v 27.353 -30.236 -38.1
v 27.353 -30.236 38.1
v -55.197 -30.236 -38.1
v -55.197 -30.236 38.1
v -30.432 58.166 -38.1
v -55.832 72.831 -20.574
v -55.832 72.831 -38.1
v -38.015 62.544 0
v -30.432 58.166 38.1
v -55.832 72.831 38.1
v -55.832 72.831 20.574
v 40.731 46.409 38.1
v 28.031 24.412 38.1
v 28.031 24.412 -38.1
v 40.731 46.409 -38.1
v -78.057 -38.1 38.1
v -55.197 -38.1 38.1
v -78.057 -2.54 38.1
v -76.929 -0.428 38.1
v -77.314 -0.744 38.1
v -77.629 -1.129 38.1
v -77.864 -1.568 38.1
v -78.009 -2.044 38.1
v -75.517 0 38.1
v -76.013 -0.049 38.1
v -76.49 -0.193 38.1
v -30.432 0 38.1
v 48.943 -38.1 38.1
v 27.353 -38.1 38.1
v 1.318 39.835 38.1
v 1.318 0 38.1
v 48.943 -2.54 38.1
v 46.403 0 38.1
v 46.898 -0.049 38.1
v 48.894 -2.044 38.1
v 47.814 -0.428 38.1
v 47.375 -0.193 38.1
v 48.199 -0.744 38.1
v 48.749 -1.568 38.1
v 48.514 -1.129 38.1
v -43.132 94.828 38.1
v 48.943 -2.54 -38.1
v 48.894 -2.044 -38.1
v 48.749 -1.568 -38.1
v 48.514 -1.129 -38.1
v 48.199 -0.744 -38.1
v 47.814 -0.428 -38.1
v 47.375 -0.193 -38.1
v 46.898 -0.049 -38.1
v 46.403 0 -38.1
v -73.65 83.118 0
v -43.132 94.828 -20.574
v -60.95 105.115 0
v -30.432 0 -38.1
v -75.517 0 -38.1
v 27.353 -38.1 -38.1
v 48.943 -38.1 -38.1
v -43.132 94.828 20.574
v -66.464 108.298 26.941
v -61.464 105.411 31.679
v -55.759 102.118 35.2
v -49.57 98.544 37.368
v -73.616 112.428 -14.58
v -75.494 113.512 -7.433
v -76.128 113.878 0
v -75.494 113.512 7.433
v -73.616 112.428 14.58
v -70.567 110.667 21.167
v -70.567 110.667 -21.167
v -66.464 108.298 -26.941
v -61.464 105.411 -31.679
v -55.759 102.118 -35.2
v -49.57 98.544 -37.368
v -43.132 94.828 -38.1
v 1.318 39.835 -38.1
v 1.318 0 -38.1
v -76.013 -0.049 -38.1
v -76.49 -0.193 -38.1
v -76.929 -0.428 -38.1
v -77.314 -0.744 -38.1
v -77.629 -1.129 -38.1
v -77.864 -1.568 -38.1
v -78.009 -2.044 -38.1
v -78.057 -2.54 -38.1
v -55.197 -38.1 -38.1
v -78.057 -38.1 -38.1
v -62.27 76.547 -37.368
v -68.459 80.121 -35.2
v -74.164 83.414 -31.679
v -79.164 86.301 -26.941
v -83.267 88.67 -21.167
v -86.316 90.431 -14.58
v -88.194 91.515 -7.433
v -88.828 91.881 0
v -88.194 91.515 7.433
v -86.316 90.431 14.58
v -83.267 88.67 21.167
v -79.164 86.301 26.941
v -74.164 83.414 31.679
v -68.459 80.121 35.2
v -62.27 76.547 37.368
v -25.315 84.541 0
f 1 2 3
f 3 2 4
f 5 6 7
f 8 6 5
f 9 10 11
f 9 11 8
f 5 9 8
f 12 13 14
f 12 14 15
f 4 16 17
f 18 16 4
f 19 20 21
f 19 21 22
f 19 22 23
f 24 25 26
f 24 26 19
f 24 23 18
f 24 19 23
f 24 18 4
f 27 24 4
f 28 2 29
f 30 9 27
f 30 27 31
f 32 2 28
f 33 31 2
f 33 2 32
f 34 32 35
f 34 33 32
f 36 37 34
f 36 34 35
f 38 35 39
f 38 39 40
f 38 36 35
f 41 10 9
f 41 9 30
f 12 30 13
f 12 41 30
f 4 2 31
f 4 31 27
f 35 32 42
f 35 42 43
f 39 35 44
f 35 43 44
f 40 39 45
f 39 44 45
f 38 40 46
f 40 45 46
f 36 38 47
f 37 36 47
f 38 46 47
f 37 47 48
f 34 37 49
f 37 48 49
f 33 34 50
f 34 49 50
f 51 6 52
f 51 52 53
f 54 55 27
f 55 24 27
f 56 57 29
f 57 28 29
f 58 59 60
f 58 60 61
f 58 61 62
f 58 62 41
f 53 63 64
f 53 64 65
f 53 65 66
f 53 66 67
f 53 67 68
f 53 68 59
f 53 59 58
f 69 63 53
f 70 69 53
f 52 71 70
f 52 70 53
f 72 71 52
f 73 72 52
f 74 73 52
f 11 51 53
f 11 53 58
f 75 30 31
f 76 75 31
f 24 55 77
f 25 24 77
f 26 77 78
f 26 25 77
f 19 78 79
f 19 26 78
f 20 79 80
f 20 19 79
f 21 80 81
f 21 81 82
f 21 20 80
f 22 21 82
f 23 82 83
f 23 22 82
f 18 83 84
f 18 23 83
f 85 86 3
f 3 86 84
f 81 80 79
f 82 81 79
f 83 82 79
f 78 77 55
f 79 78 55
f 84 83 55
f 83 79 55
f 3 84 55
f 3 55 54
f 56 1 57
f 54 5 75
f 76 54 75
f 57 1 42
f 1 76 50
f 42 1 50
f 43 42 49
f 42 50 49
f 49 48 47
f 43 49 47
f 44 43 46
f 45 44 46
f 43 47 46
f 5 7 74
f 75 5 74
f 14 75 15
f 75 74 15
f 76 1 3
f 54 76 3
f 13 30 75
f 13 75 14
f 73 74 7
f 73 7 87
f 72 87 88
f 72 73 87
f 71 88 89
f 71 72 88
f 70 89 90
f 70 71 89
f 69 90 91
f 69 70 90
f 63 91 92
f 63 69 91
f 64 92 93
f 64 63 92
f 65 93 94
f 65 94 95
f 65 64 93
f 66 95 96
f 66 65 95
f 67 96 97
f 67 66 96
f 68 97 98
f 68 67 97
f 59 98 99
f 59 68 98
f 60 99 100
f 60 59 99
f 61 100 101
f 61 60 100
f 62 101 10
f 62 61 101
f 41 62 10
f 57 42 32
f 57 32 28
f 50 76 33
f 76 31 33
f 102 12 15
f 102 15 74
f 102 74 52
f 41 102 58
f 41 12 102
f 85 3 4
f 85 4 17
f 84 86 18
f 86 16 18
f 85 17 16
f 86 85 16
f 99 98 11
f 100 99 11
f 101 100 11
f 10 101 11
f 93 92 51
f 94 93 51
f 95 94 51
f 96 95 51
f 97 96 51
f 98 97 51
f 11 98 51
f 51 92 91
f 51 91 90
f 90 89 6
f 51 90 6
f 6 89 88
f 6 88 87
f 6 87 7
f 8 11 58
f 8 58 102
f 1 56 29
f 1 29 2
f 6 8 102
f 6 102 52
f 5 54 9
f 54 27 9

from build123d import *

# Parameters (mm, degrees)
BOSS_EXTRUDE1_DEPTH      = 38.1
BOSS_EXTRUDE1_DEPTH_BACK = 38.1
FILLET3_R                = 2.54
FILLET4_R                = 2.54
BOSS_EXTRUDE2_DEPTH      = 76.2
SKETCH6_R                = 38.1
BOSS_EXTRUDE3_DEPTH      = 25.4
CUT_EXTRUDE2_DEPTH       = 141.480169548


with BuildPart() as part:
    # Sketch1 → Boss-Extrude1 (new, two sides: drawn at the far end of the back side and taken through both)
    with BuildSketch(Plane.XY.offset(-BOSS_EXTRUDE1_DEPTH_BACK)):
        Polygon((-78.057486297, 0), (-30.432486297, 0), (-30.432486297, 58.166), (1.317513703, 58.166), (1.317513703, 0), (48.942513703, 0), (48.942513703, -38.1), (27.352513703, -38.1), (27.352513703, -30.236305156), (-55.197486297, -30.236305156), (-55.197486297, -38.1), (-78.057486297, -38.1), align=None)
    extrude(amount=BOSS_EXTRUDE1_DEPTH + BOSS_EXTRUDE1_DEPTH_BACK)

    # Fillet3
    fillet3_edges = [part.edges().sort_by_distance(p)[0] for p in [
        (48.942513703, 0, 0),
    ]]
    fillet(fillet3_edges, radius=FILLET3_R)

    # Fillet4
    fillet4_edges = [part.edges().sort_by_distance(p)[0] for p in [
        (-78.057486297, 0, 0),
    ]]
    fillet(fillet4_edges, radius=FILLET4_R)

    # Sketch5 → Boss-Extrude2 (add)
    with BuildSketch(Plane.XY.offset(38.1)):
        Polygon((-55.832486297, 72.830696837), (28.031248742, 24.411946837), (40.731248742, 46.408992094), (-43.132486297, 94.827742094), align=None)
    extrude(amount=-BOSS_EXTRUDE2_DEPTH)

    # Sketch6 → Boss-Extrude3 (add)
    with BuildSketch(Plane(origin=(30.278495244, 52.443892139, 0), x_dir=(0.8660254037844386, -0.5000000000000001, 0), z_dir=(0.5000000000000001, 0.8660254037844386, 0))):
        with Locations((-84.767699909, 0)):
            Circle(SKETCH6_R)
    extrude(amount=-BOSS_EXTRUDE3_DEPTH)

    # Sketch7 → Cut-Extrude2 (cut, through all)
    with BuildSketch(Plane(origin=(17.578495244, 30.446846883, 0), x_dir=(-0.8660254037844386, 0.5000000000000001, 0), z_dir=(-0.5000000000000001, -0.8660254037844386, 0))):
        Polygon((84.767699909, 20.574), (105.341699909, 0), (84.767699909, -20.574), (64.193699909, 0), align=None)
    extrude(amount=-CUT_EXTRUDE2_DEPTH, mode=Mode.SUBTRACT)


solid = part.part
